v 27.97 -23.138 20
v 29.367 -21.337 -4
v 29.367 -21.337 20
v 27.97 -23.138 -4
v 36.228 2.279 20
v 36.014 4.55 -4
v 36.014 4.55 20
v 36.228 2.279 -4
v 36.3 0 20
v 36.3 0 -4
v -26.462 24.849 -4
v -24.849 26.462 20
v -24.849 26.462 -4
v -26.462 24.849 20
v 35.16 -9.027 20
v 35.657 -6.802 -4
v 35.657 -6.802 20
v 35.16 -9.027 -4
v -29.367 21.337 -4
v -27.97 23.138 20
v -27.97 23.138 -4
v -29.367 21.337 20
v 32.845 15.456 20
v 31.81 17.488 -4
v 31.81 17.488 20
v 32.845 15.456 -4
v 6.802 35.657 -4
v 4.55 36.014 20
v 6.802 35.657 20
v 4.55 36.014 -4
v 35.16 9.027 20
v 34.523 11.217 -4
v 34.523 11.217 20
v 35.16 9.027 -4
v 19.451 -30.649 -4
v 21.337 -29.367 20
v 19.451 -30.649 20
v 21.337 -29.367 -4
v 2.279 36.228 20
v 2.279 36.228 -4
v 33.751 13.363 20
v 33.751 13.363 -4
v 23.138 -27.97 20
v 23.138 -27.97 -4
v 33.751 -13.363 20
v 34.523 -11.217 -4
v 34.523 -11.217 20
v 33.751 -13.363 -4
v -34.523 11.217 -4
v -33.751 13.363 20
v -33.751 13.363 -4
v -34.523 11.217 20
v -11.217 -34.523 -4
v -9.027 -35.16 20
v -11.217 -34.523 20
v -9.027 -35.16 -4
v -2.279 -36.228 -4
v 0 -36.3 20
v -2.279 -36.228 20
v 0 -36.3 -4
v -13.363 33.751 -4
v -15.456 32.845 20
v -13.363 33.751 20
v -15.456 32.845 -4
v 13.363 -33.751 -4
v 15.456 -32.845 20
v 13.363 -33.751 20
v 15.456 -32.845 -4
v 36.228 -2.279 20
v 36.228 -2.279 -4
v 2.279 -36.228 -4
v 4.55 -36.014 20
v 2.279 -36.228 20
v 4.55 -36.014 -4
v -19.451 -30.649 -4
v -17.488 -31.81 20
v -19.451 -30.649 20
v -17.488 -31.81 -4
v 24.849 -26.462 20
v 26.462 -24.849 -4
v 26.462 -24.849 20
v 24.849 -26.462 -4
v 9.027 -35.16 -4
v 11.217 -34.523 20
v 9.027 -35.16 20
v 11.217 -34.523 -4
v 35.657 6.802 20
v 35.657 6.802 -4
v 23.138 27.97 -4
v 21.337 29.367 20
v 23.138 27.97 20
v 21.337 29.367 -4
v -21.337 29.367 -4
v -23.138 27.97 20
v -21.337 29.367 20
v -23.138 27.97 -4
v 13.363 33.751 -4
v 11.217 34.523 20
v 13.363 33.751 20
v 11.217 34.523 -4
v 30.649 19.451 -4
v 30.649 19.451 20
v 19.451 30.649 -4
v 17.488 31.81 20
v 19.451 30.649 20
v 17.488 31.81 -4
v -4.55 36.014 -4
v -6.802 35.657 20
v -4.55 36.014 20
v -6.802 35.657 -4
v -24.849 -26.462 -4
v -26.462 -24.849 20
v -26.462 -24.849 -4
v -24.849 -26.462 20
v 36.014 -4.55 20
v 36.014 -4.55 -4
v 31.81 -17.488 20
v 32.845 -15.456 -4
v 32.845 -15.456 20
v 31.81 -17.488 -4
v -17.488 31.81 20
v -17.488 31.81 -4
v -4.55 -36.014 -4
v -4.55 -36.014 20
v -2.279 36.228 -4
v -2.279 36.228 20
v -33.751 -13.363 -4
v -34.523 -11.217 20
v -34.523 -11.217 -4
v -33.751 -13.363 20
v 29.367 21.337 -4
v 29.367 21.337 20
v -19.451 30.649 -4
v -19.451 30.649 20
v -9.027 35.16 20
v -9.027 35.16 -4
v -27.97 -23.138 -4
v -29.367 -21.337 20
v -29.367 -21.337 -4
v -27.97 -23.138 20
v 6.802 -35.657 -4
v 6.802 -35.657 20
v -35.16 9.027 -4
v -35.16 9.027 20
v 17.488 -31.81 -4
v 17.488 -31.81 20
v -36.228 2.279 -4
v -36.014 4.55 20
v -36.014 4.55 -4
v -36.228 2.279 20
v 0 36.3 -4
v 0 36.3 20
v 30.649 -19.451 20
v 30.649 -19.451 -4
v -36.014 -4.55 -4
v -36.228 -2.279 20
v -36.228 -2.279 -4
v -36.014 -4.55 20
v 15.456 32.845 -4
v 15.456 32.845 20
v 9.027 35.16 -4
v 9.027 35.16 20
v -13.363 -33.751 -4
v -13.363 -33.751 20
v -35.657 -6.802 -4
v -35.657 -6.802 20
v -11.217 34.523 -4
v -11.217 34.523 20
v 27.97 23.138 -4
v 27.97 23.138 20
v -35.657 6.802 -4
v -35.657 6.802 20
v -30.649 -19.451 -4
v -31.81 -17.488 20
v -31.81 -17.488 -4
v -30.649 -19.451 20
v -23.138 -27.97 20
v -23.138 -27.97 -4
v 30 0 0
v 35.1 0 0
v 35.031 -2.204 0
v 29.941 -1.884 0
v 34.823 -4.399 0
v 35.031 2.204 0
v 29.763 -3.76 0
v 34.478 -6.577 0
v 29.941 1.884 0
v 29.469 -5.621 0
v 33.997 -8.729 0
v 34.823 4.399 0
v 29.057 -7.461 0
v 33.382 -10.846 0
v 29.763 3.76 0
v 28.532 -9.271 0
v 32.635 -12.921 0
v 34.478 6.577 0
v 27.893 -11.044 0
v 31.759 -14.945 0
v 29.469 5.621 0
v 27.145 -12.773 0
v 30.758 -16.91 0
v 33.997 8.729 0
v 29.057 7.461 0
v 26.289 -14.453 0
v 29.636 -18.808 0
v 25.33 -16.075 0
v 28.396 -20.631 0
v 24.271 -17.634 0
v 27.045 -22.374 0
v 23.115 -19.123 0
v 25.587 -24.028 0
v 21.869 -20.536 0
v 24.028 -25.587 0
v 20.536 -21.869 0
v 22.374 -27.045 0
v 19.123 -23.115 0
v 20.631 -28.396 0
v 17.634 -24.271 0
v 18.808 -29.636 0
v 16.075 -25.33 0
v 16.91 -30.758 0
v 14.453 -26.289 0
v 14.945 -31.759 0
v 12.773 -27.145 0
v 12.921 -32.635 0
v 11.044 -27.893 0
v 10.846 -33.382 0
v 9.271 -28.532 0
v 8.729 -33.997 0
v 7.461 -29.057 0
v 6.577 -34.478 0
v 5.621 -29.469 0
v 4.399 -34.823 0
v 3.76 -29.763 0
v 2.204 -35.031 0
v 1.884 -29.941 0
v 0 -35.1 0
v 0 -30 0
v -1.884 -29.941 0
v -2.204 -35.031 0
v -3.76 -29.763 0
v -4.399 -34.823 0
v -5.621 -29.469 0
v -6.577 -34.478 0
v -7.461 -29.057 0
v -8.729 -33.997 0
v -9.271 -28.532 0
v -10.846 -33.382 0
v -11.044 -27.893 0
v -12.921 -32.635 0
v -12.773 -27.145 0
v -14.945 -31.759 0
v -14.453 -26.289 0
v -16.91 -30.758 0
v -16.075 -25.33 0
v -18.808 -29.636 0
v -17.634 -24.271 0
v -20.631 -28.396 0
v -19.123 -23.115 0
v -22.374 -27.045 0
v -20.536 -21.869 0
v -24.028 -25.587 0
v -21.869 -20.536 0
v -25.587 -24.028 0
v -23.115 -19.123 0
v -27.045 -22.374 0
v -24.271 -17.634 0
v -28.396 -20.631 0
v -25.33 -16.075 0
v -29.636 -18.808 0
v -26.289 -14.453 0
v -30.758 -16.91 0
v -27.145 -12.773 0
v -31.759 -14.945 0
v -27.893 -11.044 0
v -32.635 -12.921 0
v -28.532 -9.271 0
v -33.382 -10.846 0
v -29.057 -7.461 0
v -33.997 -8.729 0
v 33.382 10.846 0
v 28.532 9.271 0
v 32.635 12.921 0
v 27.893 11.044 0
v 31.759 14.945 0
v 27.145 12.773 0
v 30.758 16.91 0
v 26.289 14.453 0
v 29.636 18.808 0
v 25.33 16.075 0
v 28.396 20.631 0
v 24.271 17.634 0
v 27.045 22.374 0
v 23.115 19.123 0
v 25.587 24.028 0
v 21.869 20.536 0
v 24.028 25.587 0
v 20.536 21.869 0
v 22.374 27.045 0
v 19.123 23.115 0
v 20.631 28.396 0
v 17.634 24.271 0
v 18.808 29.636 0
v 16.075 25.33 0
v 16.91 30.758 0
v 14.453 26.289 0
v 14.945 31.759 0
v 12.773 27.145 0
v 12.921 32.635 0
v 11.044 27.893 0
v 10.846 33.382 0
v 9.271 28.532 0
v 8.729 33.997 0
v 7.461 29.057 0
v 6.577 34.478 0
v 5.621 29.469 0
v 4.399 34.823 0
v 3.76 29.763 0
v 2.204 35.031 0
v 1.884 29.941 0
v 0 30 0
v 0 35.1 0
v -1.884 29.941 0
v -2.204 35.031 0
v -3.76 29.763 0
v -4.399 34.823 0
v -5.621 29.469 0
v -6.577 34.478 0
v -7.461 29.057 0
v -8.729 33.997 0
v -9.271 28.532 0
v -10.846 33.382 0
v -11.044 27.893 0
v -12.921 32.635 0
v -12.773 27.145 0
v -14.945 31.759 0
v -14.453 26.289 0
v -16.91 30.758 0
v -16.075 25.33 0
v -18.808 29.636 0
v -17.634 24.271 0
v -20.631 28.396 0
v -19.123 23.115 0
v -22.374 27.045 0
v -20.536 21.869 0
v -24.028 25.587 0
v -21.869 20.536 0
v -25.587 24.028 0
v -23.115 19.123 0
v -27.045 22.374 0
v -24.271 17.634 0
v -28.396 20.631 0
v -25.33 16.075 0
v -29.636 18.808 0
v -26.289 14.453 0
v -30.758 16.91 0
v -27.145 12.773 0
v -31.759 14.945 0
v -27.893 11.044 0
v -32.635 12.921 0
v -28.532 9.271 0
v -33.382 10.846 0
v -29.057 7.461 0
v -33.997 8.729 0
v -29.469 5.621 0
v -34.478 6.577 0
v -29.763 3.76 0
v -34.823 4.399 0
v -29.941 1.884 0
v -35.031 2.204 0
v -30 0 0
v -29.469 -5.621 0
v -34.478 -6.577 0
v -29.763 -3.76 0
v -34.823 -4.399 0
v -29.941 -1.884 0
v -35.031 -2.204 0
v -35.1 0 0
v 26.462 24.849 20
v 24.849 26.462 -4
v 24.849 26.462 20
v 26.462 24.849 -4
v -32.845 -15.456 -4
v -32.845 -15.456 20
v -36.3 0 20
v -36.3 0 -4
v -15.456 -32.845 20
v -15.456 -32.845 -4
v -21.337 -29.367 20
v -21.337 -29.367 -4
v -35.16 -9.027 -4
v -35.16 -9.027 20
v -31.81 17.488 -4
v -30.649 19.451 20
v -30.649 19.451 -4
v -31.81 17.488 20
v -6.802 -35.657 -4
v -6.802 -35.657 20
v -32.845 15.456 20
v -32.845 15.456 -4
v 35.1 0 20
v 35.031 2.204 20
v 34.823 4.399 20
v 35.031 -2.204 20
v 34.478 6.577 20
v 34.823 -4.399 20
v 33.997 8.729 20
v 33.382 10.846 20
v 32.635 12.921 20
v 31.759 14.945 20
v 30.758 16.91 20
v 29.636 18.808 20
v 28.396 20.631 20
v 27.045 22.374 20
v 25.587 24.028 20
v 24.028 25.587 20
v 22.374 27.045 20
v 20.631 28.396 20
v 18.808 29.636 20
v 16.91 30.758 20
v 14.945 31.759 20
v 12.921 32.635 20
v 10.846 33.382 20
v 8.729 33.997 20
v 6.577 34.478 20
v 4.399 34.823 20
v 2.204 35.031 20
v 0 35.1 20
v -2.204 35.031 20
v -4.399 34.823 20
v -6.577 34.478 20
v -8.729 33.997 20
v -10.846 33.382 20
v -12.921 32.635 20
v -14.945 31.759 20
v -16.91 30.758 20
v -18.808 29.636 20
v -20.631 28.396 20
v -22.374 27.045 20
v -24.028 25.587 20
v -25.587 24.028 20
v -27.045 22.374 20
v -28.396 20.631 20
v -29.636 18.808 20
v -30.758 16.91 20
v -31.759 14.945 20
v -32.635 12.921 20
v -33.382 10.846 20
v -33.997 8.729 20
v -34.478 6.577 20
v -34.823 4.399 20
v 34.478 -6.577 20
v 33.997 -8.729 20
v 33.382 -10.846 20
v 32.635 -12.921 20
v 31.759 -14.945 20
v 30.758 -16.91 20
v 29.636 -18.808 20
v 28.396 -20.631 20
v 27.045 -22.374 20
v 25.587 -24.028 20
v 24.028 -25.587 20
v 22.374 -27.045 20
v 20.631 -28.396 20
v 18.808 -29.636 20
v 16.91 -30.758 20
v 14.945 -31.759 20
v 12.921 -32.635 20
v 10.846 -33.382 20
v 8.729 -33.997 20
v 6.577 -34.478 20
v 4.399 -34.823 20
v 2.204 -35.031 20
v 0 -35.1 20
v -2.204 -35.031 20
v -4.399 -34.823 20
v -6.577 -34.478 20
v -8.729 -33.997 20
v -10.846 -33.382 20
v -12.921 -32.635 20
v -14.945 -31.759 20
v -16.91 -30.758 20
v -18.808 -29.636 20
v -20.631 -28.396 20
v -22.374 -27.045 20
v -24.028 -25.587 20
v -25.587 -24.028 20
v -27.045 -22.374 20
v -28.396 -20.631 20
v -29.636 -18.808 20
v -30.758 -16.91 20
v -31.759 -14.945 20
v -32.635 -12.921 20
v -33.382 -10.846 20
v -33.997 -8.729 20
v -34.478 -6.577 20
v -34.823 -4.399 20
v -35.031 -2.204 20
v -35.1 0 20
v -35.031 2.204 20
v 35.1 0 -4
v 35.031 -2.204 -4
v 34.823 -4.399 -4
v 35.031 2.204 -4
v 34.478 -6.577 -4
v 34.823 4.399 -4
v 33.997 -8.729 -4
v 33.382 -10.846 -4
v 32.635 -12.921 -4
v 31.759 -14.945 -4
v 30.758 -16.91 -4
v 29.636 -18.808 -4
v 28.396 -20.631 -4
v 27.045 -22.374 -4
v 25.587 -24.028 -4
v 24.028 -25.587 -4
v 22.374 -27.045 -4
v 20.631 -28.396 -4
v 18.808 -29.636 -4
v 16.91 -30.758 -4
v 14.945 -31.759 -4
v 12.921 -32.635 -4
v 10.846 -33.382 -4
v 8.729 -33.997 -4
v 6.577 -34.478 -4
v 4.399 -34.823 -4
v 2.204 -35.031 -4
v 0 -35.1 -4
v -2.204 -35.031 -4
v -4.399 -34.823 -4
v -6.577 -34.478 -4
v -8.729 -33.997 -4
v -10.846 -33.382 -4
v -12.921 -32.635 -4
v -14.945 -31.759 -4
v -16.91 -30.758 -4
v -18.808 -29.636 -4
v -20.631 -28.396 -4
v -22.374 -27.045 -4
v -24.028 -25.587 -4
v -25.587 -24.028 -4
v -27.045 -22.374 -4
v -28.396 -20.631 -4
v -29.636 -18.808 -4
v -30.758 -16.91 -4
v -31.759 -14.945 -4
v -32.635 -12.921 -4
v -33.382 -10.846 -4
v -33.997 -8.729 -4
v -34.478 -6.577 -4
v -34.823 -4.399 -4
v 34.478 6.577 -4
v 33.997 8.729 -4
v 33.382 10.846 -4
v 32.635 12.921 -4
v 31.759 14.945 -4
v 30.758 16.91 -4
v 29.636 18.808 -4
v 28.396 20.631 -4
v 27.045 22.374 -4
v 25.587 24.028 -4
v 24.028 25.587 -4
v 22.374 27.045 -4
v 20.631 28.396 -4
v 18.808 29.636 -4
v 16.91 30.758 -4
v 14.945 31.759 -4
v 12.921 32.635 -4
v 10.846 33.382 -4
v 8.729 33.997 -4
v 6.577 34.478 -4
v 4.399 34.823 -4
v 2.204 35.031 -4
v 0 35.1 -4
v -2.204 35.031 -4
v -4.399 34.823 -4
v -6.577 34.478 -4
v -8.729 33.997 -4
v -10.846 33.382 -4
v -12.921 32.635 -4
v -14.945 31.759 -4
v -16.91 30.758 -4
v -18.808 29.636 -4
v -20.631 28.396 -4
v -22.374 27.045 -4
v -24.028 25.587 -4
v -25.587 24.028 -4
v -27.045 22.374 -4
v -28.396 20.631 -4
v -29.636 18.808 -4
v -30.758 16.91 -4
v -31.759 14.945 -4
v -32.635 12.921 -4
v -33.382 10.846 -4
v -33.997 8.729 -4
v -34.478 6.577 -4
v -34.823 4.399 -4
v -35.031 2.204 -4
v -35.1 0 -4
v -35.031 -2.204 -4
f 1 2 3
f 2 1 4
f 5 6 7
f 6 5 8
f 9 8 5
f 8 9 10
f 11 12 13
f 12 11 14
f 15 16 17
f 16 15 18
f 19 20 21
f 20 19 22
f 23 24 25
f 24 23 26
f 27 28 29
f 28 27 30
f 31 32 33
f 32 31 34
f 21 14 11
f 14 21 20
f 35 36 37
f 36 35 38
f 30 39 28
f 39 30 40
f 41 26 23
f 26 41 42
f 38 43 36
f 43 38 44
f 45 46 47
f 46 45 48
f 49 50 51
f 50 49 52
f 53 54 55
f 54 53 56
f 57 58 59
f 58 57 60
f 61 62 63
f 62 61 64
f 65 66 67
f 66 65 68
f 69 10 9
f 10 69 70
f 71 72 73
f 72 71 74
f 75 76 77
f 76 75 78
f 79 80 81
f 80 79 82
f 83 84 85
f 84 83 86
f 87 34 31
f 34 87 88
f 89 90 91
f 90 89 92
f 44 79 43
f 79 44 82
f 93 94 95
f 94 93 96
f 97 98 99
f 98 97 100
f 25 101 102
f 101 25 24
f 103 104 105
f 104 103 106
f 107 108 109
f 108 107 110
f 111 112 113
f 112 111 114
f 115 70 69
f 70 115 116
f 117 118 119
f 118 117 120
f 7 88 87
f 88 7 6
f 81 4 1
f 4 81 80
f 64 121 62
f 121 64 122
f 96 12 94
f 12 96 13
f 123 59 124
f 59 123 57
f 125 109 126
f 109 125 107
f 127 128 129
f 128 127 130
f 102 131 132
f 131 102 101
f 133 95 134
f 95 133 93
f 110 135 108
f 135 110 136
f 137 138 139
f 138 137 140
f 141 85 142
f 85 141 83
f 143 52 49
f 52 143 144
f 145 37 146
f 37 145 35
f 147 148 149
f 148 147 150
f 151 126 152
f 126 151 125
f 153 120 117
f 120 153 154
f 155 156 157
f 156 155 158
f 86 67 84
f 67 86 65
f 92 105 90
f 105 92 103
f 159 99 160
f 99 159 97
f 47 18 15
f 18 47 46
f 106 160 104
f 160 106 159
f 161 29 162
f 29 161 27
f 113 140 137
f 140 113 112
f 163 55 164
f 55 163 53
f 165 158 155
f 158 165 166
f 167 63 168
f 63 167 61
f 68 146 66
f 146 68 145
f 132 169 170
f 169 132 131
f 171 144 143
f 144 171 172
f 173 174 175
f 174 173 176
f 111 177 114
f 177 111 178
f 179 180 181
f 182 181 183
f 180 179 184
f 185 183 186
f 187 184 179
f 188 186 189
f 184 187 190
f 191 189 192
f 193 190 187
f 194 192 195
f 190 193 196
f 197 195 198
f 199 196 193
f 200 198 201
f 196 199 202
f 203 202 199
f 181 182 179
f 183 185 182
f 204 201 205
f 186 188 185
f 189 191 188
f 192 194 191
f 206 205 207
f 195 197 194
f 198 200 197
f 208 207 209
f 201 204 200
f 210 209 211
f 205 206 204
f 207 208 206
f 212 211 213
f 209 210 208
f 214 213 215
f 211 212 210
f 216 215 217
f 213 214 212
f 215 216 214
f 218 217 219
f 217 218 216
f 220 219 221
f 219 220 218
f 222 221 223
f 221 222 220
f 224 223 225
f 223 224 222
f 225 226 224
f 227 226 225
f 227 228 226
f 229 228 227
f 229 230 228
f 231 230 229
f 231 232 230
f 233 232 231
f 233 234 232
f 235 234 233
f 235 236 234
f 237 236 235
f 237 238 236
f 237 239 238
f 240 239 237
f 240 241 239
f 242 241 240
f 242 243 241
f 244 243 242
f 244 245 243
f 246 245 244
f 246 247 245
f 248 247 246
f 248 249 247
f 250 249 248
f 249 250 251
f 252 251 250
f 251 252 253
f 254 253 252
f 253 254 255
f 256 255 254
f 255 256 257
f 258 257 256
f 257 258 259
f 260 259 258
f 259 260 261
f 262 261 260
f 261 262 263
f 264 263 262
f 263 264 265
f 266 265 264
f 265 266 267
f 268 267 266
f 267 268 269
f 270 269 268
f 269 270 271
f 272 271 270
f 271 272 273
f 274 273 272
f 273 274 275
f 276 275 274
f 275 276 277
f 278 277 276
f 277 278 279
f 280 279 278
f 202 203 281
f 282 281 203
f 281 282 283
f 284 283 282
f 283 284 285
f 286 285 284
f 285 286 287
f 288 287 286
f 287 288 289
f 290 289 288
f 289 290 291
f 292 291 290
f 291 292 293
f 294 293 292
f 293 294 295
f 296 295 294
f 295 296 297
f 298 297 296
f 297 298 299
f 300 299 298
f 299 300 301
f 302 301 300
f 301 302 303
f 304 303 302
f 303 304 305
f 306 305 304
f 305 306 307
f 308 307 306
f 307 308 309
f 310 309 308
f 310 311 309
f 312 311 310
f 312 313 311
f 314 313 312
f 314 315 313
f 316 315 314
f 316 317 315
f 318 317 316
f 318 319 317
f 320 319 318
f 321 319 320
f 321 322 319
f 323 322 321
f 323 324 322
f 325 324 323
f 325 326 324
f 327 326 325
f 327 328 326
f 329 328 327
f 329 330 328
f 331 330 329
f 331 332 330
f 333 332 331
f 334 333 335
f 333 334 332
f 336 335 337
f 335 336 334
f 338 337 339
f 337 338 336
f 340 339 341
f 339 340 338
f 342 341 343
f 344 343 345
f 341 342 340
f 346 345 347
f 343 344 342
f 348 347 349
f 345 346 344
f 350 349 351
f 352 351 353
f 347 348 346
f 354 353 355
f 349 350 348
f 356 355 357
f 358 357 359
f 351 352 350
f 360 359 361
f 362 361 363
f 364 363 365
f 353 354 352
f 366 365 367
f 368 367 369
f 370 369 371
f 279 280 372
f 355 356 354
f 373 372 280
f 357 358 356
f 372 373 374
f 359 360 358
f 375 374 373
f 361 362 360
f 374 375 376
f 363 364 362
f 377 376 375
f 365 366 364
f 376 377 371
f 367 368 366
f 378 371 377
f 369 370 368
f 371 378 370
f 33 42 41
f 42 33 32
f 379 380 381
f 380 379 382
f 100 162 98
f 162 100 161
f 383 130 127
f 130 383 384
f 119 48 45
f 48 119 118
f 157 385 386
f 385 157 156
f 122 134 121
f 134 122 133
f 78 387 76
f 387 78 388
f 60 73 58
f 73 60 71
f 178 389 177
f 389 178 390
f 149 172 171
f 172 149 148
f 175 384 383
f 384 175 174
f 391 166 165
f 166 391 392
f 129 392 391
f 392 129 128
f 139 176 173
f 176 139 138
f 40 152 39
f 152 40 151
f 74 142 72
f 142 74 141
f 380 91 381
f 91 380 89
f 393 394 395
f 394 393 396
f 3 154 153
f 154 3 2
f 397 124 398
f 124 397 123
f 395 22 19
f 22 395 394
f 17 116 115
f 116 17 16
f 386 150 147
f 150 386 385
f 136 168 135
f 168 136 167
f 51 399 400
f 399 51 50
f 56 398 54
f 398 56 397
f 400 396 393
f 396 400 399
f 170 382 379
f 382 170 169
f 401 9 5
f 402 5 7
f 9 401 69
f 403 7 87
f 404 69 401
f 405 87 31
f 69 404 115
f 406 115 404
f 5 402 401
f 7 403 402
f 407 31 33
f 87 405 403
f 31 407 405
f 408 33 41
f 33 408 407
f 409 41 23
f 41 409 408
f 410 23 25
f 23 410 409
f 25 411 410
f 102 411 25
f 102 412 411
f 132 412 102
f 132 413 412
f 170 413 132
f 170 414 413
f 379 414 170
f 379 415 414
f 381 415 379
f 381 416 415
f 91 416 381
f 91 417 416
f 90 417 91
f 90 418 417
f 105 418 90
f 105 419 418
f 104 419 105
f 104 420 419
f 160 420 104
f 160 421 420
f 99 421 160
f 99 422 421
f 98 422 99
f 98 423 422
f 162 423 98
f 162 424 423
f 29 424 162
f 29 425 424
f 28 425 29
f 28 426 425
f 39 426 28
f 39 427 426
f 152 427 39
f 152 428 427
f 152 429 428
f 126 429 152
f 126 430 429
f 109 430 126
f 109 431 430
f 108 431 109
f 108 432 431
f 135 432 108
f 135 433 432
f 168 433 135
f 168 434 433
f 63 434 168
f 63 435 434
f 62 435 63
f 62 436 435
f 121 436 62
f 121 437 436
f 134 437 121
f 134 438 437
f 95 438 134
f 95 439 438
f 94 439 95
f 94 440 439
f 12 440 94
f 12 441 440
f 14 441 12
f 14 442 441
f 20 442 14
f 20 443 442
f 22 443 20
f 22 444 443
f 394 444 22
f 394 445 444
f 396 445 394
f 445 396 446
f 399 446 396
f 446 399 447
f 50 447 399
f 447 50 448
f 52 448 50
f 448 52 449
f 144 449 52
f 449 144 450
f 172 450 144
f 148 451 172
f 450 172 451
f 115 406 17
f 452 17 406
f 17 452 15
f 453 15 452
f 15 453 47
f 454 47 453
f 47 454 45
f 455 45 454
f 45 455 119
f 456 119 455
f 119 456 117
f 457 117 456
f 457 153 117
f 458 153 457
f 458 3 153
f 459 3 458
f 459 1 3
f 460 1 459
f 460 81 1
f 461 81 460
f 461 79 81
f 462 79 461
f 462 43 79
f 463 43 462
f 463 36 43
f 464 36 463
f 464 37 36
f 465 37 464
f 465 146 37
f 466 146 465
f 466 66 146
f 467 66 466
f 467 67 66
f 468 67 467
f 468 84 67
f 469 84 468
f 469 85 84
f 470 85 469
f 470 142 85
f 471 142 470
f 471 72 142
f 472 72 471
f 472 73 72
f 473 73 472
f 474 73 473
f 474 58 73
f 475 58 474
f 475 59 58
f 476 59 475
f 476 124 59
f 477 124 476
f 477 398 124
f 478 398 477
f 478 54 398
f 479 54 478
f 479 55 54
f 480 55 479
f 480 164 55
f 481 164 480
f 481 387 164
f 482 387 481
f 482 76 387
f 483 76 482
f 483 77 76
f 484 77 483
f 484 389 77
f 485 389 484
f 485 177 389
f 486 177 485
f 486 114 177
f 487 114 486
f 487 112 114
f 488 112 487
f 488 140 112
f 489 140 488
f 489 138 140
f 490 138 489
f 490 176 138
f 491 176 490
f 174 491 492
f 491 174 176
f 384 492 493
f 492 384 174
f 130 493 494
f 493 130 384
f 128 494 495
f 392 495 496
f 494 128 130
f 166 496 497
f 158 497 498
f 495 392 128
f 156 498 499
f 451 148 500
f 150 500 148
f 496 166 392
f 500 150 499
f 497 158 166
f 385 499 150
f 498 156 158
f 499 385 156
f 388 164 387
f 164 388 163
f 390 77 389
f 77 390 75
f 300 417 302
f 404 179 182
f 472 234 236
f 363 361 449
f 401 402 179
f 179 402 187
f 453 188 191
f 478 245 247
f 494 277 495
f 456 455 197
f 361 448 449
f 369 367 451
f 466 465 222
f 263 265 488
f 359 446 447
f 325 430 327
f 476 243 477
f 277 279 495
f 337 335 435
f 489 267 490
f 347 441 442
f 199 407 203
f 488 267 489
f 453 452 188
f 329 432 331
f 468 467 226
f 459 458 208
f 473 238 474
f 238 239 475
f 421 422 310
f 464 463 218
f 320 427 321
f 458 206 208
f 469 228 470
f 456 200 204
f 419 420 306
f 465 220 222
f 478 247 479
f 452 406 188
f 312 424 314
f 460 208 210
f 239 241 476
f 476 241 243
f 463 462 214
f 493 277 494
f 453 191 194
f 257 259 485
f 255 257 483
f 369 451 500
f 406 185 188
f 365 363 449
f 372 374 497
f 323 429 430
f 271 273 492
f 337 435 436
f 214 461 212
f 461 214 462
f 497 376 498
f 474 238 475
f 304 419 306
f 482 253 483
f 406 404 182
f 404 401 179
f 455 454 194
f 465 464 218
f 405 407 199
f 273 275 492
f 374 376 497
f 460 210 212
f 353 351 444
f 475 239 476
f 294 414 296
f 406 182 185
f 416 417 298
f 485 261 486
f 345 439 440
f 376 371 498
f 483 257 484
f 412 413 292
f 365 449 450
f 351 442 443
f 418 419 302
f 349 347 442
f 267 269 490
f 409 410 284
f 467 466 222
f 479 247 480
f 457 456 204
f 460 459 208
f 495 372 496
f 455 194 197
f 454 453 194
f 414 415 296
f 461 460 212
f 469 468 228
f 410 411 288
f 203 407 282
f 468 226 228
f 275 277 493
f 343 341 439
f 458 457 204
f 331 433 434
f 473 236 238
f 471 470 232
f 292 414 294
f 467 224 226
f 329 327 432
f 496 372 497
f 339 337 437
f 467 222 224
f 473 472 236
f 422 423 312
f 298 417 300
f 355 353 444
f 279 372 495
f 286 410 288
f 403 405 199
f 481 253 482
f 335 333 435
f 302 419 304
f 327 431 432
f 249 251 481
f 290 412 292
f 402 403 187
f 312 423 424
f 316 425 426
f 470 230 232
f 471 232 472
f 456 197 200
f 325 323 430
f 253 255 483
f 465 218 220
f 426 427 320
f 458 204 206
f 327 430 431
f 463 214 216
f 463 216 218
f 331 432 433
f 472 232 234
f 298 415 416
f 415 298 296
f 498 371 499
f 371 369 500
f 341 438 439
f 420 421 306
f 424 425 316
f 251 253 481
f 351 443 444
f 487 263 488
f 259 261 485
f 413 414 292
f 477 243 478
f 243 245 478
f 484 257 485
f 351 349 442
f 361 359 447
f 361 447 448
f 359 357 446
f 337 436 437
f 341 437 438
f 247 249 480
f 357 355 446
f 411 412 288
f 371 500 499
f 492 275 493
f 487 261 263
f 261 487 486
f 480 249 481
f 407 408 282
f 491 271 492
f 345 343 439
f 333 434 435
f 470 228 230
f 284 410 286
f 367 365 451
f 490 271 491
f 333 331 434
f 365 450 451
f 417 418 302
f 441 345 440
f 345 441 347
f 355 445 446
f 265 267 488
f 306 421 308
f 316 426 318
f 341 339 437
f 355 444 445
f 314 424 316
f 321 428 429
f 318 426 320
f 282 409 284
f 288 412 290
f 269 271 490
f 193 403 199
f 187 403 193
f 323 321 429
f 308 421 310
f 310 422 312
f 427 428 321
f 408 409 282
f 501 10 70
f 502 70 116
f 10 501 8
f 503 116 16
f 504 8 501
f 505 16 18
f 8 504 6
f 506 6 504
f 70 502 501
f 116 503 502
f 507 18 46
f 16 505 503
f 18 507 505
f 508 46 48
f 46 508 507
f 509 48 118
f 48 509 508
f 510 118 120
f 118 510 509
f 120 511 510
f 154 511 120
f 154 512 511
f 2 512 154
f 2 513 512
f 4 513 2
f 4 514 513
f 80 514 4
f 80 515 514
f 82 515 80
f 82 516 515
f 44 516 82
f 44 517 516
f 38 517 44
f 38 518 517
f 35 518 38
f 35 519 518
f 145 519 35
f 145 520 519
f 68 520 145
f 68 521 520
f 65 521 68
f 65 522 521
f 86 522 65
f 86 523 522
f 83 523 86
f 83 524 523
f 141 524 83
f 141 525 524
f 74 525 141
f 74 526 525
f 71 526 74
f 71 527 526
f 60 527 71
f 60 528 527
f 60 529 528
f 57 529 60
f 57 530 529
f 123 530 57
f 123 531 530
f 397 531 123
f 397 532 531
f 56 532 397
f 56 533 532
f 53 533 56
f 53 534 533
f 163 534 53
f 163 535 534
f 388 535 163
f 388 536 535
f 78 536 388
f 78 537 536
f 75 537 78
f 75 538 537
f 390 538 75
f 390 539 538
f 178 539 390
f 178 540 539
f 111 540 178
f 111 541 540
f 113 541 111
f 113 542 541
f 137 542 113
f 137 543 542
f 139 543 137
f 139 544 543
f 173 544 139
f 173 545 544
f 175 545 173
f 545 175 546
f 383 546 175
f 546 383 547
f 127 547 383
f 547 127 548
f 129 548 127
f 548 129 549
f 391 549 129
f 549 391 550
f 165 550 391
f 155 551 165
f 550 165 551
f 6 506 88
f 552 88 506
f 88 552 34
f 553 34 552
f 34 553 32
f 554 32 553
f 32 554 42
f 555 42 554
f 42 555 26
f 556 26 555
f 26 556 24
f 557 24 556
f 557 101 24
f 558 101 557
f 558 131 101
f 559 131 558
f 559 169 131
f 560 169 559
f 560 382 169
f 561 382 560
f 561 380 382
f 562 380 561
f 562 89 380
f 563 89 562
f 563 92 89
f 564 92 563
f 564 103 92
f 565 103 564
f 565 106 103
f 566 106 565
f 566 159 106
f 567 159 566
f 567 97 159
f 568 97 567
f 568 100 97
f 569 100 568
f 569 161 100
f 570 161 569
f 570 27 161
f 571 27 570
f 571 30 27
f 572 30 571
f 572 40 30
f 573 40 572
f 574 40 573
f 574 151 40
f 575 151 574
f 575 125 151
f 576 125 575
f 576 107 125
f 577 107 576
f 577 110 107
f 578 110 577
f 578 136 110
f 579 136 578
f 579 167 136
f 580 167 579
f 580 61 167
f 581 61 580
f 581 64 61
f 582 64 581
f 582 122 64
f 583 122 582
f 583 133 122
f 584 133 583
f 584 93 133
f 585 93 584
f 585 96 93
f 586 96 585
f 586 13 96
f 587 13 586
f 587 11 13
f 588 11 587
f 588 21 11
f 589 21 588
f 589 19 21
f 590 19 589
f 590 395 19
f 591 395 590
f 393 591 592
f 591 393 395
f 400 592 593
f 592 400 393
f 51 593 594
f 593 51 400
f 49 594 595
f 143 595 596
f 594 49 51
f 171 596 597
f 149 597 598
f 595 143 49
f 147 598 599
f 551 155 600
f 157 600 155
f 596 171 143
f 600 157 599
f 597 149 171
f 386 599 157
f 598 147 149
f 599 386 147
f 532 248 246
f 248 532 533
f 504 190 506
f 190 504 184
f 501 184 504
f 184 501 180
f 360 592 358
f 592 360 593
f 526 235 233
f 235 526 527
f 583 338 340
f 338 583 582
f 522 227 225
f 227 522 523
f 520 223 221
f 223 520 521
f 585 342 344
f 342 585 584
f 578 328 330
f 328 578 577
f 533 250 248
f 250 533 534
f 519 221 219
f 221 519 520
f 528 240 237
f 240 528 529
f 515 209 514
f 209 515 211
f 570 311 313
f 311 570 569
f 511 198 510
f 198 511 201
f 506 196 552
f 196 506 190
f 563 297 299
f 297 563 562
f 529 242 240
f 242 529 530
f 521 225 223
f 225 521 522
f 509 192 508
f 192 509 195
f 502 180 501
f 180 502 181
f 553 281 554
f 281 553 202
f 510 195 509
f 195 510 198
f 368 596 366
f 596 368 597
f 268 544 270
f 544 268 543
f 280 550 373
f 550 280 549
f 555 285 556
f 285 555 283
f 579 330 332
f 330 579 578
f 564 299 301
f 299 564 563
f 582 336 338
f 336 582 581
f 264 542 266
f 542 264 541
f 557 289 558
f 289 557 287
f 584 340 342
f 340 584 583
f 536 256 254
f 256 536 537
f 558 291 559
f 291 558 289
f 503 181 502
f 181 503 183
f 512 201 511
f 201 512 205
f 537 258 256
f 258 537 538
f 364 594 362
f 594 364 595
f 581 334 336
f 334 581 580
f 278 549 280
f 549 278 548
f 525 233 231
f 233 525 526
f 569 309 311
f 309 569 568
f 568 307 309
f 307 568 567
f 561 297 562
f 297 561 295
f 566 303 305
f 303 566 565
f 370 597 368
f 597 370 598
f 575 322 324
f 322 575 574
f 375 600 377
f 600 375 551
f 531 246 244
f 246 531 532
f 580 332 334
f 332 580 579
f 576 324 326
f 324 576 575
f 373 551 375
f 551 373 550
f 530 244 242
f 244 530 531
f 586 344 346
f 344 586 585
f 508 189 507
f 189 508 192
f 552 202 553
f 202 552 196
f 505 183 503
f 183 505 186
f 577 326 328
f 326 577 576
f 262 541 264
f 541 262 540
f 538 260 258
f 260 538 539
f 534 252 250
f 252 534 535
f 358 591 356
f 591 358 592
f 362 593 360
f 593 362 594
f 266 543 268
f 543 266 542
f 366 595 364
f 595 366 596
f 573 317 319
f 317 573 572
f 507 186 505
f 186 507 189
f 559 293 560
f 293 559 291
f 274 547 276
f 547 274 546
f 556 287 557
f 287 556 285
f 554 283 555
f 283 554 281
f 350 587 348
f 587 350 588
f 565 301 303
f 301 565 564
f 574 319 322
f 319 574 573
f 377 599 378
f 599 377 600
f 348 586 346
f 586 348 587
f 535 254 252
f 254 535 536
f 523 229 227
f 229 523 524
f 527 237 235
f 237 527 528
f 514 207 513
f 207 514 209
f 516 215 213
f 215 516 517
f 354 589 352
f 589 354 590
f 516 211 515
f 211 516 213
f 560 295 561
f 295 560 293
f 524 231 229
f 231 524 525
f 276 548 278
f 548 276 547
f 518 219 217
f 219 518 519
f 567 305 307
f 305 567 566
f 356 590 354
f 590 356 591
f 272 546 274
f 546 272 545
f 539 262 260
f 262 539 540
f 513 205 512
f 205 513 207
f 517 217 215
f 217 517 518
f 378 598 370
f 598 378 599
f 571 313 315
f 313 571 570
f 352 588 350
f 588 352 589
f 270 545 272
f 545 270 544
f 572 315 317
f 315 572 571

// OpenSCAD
R0 =(70 + 0.2)/2;
R1 = 60/2; 


$fn=100;


difference(){
cylinder(h=20, r1=R0+1.2, r2=R0+1.2);
cylinder(h=20, r1=R1, r2=R0);
}



//bottom insert
translate([0,0,-4])
difference(){
cylinder(h=4, r=R0 + 1.2);

cylinder(h=4, r=R0);

}
